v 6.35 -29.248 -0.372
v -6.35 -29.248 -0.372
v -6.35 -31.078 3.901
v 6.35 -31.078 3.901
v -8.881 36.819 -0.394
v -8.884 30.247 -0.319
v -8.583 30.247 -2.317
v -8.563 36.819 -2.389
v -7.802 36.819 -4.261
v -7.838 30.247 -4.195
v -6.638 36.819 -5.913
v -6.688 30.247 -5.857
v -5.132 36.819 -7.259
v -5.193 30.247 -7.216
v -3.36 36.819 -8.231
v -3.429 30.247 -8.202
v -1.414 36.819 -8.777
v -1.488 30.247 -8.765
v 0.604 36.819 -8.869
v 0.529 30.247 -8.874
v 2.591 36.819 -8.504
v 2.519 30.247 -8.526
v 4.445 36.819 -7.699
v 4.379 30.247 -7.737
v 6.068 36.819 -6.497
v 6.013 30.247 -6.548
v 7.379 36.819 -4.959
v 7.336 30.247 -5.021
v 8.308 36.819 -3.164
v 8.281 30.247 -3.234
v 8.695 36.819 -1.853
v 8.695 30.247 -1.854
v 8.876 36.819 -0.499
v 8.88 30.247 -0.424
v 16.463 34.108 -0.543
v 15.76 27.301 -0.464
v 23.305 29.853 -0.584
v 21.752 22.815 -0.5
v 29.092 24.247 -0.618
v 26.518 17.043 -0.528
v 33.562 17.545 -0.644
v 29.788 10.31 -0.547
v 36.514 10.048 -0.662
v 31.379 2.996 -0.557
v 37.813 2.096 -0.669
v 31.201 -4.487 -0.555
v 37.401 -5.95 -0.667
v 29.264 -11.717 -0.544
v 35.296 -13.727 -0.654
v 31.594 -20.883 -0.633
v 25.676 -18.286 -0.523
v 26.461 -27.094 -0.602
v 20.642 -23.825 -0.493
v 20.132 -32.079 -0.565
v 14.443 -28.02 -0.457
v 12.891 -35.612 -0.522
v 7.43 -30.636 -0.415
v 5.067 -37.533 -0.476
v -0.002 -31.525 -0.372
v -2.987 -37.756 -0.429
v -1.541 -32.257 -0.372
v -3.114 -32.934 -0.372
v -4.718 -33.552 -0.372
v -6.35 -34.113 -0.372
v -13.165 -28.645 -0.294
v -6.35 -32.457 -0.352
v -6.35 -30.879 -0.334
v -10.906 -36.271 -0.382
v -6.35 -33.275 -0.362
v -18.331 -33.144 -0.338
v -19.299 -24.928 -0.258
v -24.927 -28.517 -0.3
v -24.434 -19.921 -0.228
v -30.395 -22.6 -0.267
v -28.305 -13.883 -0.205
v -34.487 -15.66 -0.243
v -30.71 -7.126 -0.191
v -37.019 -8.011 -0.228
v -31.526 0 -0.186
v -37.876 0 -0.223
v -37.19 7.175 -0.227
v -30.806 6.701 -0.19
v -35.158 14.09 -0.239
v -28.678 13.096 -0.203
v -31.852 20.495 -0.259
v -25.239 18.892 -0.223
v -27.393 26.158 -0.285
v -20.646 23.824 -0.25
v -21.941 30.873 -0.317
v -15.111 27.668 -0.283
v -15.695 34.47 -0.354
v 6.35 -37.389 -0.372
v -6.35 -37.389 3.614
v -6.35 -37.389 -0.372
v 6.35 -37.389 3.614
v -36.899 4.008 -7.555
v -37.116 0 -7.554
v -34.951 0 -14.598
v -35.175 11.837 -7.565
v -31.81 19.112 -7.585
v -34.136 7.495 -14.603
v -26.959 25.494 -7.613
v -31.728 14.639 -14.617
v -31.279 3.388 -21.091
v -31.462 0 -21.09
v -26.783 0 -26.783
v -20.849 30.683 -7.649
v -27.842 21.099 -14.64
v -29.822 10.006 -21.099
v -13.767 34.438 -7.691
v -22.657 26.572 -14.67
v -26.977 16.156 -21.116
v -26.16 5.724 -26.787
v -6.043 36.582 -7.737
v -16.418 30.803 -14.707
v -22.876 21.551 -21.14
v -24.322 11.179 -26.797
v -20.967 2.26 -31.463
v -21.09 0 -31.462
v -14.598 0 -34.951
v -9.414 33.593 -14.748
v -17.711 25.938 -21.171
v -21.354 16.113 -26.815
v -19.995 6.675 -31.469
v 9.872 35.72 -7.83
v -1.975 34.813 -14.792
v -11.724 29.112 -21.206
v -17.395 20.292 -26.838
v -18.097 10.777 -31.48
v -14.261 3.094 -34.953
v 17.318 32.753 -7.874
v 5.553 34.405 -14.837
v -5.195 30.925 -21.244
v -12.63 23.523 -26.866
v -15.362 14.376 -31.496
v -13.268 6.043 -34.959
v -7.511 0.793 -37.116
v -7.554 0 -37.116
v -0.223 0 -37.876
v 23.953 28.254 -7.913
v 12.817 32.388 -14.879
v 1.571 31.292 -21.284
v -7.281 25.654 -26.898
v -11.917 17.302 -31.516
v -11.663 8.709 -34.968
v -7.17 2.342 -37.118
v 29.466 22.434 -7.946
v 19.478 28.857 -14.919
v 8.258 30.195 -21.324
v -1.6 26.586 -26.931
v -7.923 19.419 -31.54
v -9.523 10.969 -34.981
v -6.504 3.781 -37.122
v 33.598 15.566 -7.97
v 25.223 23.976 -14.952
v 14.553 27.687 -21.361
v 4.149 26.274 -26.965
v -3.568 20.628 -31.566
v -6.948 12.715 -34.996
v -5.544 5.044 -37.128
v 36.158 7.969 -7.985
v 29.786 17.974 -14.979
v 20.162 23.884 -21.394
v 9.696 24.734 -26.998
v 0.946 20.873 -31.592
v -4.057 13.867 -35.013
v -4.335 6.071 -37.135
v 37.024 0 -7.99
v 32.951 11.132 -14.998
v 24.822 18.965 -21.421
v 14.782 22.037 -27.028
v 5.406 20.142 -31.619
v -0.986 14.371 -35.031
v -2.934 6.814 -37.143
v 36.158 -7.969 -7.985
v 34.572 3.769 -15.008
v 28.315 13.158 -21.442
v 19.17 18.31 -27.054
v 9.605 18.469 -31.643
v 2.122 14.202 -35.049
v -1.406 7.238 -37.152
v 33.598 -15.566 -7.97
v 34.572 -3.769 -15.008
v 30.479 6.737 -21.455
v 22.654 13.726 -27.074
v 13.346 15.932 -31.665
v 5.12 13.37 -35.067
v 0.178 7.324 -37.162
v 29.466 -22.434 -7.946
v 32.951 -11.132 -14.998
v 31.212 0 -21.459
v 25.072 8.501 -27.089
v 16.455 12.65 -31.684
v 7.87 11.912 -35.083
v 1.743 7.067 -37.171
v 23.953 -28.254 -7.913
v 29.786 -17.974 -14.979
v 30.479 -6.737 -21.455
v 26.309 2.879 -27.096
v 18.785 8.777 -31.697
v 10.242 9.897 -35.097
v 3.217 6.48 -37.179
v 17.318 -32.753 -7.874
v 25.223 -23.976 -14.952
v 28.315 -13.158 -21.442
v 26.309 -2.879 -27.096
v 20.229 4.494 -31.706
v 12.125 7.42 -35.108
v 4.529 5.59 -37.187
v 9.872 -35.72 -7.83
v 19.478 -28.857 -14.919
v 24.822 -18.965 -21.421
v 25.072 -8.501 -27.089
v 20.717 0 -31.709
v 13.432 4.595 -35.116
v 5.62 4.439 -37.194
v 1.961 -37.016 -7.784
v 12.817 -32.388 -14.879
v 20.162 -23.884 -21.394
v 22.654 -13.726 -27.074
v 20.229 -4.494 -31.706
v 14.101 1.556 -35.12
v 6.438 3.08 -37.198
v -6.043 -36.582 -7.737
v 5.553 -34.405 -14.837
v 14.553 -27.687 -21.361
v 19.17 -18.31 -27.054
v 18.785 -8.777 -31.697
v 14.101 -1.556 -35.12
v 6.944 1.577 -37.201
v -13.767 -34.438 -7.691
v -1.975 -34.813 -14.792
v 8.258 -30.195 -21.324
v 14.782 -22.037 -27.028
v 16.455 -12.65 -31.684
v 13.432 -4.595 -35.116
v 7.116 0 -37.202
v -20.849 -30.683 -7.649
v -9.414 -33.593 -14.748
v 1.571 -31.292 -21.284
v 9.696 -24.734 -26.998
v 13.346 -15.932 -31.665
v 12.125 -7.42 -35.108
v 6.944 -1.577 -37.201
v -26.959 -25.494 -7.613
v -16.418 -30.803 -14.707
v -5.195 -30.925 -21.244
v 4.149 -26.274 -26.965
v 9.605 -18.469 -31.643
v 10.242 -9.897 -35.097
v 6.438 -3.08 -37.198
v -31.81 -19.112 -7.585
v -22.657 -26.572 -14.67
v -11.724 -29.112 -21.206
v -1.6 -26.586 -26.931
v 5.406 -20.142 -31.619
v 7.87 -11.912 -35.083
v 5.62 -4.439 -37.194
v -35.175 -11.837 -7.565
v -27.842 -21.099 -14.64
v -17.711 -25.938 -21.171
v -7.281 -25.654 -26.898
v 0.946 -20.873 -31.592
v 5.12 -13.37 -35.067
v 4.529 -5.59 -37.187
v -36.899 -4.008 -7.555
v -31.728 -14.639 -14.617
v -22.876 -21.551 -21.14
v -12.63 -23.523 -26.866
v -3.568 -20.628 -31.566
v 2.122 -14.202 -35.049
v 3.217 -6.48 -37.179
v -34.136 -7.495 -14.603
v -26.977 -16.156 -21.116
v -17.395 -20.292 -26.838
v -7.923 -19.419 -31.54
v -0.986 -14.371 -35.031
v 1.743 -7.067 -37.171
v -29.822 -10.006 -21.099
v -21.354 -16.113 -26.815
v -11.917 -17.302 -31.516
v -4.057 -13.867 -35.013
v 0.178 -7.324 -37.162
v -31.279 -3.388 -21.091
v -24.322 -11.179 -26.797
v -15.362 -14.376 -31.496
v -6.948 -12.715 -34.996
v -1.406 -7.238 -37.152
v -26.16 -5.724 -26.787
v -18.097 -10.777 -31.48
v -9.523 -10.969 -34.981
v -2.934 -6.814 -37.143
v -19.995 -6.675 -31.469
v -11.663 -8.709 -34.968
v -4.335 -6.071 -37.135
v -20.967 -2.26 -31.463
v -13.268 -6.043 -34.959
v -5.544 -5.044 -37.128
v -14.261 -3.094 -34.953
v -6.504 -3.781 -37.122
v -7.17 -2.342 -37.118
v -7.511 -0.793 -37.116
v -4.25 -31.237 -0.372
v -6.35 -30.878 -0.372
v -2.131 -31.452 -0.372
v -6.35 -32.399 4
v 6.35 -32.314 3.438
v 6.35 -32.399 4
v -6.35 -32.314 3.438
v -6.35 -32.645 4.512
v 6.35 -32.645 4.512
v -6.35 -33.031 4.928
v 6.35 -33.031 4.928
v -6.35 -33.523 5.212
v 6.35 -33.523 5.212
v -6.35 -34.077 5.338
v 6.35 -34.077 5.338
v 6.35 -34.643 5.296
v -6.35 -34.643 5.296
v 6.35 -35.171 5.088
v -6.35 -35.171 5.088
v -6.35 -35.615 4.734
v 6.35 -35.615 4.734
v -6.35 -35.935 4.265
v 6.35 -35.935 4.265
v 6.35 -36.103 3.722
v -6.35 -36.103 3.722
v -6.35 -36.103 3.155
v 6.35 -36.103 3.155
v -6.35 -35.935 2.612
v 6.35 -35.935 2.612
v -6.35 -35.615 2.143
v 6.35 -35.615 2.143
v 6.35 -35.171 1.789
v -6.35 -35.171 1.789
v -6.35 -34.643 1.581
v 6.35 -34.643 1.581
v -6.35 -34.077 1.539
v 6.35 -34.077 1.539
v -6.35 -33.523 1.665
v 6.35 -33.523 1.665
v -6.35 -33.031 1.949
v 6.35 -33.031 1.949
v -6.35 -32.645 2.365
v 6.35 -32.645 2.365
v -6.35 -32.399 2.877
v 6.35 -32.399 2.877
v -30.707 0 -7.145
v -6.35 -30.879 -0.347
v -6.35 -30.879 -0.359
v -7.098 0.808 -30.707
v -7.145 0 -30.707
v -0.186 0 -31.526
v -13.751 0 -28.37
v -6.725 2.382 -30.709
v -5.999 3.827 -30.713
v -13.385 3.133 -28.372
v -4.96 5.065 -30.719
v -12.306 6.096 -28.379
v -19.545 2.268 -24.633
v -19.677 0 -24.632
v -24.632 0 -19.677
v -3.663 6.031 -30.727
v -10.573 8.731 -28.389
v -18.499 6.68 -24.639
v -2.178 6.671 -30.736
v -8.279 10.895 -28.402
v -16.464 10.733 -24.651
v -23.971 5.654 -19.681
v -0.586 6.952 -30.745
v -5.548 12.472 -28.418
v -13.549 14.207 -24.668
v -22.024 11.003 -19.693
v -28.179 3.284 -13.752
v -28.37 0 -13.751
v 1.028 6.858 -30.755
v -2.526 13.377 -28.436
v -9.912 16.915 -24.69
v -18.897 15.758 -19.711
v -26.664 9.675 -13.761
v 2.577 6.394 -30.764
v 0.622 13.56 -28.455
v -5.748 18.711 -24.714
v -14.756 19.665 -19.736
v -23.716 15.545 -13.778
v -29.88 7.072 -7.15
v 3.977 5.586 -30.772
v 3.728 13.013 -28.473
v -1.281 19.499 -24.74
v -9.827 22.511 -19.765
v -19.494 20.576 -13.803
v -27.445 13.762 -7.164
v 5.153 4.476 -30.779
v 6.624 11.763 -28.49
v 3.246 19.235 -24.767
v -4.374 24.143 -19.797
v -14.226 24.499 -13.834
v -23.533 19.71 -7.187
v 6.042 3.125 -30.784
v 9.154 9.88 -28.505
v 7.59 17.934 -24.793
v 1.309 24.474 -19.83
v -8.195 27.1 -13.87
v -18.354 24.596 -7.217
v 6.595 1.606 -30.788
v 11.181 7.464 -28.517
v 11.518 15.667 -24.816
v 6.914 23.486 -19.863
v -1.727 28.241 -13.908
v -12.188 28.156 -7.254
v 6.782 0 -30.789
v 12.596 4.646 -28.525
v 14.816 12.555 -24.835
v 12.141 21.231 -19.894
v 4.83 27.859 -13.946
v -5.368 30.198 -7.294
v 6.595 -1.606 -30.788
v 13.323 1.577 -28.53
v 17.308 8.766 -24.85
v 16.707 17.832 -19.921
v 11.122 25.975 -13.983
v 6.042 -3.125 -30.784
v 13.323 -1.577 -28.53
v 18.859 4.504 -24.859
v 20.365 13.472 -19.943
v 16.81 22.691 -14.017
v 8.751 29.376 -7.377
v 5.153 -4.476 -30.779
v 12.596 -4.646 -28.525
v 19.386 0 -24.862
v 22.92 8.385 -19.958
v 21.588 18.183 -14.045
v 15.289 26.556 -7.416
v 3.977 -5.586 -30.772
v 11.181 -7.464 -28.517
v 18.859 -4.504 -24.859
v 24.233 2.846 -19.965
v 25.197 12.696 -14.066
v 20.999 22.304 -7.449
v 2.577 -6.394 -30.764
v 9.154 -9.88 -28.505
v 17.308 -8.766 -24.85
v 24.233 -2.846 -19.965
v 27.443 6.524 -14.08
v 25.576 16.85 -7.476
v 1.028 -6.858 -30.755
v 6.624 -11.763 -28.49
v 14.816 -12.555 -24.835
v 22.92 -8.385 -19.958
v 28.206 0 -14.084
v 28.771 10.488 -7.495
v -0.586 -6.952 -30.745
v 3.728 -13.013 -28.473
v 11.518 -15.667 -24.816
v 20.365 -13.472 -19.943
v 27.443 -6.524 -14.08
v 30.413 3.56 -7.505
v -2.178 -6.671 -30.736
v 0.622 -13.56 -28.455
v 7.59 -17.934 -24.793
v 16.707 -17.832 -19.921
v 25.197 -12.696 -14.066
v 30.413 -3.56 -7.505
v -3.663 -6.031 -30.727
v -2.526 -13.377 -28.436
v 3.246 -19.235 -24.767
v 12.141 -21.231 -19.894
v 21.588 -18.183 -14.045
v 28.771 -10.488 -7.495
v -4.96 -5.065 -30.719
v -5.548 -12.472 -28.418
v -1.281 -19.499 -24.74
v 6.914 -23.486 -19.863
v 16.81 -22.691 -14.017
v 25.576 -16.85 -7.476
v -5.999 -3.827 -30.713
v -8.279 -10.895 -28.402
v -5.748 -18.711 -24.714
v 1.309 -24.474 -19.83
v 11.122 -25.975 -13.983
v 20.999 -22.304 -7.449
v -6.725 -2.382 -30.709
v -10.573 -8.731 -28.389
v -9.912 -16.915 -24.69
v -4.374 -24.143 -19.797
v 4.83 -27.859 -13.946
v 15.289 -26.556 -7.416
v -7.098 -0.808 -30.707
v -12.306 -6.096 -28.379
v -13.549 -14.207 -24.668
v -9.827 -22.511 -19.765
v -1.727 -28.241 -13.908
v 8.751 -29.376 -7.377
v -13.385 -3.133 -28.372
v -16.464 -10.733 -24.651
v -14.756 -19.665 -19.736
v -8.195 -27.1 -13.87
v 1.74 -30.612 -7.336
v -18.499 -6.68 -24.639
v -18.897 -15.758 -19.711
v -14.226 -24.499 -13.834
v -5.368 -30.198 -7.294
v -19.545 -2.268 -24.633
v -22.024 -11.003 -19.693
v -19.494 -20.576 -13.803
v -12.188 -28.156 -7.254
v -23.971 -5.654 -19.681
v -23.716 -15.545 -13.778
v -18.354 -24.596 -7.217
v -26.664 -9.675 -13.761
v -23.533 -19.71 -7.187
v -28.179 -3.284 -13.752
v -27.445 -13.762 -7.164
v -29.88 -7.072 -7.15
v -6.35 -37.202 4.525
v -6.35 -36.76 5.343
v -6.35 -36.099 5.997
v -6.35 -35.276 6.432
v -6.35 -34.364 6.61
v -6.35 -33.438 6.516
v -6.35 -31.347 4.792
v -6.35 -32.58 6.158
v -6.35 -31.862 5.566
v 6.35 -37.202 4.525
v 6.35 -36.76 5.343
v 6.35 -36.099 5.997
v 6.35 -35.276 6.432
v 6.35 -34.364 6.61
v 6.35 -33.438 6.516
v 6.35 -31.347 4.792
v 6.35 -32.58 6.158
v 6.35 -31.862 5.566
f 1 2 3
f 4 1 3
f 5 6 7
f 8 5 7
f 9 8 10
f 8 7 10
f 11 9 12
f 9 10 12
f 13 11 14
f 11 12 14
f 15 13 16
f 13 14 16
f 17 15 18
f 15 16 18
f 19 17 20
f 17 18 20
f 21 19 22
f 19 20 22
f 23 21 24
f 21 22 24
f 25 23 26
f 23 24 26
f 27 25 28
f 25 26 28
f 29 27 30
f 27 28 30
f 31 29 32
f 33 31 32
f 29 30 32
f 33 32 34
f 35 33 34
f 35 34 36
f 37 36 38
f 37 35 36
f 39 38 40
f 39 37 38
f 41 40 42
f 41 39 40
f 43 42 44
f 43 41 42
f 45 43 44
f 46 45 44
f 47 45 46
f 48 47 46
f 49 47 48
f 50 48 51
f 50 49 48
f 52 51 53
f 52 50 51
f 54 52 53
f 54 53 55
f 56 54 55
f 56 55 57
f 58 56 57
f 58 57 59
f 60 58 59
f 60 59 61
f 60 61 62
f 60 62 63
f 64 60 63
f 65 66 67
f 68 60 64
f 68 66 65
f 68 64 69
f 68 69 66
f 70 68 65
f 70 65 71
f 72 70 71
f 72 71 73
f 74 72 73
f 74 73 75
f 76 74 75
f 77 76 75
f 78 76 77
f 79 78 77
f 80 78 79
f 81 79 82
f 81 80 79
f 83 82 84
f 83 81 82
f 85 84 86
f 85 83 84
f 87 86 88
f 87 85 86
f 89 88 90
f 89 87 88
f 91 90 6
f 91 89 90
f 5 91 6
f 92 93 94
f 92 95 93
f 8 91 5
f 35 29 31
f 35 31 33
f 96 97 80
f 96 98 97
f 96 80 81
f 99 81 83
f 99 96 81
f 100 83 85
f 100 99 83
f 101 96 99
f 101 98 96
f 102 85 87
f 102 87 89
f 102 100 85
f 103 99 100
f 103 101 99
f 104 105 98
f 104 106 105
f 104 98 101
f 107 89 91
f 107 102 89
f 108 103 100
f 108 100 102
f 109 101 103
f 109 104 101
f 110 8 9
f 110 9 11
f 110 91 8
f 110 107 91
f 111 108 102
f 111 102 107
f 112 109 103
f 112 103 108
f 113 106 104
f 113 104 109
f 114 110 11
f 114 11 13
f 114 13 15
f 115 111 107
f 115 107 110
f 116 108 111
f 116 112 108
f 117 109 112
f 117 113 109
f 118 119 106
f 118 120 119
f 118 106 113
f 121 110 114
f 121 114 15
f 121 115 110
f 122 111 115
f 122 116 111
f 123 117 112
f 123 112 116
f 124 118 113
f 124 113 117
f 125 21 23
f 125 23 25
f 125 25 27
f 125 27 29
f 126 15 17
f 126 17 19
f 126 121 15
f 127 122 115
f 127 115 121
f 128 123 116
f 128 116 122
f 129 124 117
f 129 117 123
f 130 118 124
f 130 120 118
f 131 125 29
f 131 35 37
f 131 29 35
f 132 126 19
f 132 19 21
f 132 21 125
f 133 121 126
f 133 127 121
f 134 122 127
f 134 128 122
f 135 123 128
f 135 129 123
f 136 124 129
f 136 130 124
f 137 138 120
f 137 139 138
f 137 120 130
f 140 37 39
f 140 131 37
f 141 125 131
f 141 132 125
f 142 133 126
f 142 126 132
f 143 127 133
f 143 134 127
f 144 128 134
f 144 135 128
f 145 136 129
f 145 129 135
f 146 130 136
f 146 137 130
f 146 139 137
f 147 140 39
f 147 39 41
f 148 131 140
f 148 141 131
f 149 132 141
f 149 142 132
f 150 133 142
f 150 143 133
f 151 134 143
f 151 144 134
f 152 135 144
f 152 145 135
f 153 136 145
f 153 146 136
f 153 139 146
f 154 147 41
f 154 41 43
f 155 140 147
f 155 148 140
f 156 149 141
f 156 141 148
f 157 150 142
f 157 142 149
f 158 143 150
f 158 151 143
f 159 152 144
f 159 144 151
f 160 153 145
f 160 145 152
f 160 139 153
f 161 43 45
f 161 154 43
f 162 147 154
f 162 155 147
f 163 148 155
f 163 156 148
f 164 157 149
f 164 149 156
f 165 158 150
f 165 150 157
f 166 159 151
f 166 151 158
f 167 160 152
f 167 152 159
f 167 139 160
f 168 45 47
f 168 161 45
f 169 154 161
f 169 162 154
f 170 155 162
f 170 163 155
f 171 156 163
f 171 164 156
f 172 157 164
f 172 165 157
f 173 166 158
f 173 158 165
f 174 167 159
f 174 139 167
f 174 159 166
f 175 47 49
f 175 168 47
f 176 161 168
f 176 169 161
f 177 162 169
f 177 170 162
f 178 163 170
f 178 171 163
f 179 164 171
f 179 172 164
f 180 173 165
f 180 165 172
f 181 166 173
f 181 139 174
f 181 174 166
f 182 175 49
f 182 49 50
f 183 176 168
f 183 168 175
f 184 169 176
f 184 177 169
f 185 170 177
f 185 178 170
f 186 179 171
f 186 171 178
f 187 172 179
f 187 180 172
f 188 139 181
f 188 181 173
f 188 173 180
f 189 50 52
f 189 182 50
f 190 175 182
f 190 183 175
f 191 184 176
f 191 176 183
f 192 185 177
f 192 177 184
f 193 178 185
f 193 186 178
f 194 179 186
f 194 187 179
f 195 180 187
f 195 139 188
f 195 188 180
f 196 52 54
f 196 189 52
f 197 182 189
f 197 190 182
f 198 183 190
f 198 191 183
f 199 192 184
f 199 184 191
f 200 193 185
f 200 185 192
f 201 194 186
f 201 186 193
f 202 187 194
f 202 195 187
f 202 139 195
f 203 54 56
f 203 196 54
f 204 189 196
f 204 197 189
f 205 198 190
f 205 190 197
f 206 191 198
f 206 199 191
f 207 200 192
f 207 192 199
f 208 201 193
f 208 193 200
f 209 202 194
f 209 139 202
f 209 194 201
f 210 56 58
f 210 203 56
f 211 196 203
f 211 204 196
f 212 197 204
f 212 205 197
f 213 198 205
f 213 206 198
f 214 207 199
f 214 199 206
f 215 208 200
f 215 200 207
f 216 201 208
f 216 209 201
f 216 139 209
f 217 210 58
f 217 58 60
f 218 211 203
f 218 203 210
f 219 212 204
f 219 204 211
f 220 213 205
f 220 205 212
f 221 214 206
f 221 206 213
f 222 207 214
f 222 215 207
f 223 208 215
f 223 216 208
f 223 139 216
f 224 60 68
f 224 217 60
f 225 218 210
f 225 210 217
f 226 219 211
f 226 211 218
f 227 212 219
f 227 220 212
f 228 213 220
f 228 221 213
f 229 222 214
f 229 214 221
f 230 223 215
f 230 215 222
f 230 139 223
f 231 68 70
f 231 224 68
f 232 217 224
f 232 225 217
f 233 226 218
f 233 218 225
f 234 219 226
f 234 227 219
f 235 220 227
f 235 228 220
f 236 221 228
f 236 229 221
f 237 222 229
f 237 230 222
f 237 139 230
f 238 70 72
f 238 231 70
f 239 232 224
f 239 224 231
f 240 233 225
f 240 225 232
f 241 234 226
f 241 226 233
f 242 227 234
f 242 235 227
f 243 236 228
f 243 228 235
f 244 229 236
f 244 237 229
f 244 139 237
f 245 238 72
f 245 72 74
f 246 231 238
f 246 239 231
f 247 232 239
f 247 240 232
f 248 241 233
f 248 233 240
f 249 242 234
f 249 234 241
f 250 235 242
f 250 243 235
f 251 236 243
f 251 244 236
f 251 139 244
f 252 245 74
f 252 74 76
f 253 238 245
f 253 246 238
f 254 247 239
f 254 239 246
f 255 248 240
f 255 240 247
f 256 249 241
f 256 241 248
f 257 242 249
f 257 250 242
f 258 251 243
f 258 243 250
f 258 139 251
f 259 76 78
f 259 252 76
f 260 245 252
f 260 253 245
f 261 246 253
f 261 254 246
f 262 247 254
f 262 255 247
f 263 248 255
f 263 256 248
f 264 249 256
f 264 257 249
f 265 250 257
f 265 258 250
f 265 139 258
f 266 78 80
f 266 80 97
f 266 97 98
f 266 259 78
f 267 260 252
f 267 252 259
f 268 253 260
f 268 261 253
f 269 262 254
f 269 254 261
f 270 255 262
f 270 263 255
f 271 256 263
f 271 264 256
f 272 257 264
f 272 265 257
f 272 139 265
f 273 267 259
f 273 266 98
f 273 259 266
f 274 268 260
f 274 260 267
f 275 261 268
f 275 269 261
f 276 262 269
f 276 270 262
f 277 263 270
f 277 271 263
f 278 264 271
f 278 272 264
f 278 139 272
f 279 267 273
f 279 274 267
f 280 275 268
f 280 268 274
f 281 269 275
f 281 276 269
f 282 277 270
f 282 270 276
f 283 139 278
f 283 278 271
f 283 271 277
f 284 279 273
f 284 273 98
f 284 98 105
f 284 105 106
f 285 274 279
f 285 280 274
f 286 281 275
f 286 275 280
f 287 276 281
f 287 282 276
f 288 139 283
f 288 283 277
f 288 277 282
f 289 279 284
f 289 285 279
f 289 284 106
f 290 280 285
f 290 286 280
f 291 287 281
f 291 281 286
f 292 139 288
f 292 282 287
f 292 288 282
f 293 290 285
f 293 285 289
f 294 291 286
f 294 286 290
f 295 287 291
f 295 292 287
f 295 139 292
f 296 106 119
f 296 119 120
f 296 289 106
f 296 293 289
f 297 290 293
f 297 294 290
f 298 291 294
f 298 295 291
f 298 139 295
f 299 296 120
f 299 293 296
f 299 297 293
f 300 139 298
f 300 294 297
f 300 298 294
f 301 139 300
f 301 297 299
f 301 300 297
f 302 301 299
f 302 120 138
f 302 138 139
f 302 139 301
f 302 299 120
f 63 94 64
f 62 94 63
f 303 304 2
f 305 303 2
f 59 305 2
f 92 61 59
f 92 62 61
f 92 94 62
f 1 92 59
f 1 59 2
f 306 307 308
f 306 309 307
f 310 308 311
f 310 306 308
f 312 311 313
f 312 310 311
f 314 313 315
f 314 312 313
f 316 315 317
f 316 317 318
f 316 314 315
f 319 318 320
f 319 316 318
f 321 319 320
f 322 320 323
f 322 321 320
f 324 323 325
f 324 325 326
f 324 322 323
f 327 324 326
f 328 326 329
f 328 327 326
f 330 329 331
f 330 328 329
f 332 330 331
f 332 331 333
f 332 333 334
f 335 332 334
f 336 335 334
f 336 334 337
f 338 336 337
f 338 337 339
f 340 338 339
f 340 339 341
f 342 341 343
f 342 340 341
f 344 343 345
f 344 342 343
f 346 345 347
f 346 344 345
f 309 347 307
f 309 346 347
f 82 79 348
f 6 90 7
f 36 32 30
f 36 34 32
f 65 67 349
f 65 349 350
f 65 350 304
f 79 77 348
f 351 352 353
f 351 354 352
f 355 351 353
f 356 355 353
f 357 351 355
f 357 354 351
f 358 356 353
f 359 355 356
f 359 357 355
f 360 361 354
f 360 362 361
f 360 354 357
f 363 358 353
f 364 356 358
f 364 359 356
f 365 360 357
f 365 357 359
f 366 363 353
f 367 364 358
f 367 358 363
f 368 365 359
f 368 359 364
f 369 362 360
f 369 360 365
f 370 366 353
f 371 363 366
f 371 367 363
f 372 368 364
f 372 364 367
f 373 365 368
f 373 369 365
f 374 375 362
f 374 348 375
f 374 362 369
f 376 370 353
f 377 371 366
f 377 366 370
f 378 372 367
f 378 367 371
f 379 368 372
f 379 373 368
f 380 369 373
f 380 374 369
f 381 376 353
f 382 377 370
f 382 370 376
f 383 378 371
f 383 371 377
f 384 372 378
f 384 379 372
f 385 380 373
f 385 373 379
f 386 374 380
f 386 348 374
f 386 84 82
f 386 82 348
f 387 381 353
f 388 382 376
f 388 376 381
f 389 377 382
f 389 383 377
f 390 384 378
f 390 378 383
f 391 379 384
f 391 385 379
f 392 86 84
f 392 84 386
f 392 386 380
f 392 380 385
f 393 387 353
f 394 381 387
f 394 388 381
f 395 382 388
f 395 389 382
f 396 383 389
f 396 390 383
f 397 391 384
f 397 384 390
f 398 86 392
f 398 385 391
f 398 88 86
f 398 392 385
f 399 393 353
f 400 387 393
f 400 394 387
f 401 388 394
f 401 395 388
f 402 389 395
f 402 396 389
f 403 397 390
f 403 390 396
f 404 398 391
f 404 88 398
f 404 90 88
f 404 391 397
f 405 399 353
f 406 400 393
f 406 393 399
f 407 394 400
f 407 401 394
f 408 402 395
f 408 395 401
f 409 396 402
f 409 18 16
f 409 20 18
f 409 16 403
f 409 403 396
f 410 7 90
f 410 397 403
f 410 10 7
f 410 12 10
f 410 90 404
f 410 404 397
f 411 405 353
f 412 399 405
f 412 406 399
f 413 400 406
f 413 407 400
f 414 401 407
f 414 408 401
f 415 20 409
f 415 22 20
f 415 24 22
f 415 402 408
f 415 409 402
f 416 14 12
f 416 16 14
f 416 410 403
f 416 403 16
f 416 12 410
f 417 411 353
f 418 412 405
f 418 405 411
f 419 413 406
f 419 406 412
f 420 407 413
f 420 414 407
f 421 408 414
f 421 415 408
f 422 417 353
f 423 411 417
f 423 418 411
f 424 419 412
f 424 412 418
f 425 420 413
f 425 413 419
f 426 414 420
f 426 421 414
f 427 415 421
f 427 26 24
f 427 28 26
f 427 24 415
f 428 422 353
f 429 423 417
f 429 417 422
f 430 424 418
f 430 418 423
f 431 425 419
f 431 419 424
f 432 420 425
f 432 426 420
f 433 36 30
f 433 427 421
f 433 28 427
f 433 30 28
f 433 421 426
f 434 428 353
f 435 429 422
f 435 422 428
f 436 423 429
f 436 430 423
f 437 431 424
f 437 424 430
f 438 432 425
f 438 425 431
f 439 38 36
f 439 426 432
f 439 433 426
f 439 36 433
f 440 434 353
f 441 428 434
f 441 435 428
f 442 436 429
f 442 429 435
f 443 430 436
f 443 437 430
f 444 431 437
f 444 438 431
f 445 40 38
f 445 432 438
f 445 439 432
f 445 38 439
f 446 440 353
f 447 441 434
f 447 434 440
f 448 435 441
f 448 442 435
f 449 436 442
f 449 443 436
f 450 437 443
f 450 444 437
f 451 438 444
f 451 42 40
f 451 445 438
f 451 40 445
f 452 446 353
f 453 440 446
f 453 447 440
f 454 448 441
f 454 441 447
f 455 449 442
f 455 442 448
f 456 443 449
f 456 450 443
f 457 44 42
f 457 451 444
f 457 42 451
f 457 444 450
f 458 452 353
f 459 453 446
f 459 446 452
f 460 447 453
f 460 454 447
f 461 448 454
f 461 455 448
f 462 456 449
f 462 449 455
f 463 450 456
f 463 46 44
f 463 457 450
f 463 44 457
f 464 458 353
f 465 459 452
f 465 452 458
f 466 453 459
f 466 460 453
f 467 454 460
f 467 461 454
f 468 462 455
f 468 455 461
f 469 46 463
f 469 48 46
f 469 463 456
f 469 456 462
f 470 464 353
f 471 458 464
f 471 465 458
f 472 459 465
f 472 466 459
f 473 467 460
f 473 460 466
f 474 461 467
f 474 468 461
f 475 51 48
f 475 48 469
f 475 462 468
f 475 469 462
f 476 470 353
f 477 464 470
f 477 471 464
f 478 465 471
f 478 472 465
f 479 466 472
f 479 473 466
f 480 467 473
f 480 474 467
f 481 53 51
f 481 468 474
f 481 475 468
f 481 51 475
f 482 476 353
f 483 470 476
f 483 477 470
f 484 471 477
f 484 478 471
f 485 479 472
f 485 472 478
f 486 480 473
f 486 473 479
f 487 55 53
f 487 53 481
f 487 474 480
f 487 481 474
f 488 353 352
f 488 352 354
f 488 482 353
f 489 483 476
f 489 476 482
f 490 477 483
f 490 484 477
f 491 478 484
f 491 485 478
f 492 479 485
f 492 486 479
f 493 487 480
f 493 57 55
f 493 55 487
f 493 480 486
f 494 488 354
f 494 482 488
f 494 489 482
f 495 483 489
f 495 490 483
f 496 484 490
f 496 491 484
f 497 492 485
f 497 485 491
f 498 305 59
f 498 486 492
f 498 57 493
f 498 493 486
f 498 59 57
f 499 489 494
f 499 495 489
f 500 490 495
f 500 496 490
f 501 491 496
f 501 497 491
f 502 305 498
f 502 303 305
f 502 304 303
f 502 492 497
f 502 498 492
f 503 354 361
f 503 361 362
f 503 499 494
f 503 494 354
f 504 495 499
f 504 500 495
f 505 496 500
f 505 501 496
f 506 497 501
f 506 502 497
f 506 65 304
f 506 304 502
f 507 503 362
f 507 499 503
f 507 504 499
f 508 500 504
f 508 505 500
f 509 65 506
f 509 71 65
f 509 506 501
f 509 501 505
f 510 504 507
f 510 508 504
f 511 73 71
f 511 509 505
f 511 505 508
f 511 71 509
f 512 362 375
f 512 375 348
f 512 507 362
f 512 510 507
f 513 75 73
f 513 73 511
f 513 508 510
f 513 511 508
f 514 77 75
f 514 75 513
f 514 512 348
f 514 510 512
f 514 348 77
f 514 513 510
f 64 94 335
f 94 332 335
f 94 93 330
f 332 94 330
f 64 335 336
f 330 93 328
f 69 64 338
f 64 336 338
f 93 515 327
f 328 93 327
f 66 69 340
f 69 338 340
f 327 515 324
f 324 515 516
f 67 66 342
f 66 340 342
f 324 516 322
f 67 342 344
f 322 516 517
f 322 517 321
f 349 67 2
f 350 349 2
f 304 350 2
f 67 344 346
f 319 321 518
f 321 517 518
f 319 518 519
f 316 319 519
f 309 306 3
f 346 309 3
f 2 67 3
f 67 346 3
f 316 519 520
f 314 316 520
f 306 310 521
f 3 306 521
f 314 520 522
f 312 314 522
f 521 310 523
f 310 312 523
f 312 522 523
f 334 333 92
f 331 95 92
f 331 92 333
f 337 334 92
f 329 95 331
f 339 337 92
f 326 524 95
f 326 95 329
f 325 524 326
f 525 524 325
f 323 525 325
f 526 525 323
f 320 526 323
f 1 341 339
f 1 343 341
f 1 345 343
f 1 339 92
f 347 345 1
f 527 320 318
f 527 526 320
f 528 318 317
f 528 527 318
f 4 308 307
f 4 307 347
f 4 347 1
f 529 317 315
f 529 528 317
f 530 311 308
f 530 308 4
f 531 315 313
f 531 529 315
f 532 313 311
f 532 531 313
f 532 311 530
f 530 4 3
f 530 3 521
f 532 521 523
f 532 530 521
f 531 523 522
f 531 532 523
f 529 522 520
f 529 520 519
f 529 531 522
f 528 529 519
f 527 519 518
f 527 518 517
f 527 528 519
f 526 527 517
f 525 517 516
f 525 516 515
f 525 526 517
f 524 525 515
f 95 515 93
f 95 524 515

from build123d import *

# Parameters (mm, degrees)
F2_R     = 8.89
F3_DEPTH = 37.8751575137
F4_R     = 1.905
F5_DEPTH = 6.35


with BuildPart() as f1:
    # F0 (on Front) → F1 (revolve)
    with BuildSketch(Plane.XZ):
        with BuildLine():
            ThreePointArc((-0.1857913862, -31.5262409051), (-22.2928058356, -22.2928058356), (-31.5262409051, -0.1857913862))
            Line((-31.5262409051, -0.1857913862), (-37.8761306398, -0.2232127463))
            ThreePointArc((-37.8761306398, -0.2232127463), (-26.7829338961, -26.7829338961), (-0.2232127463, -37.8761306398))
            Line((-0.2232127463, -37.8761306398), (-0.1857913862, -31.5262409051))
        make_face()
    revolve(axis=Axis((-0.2045020662, 0, -34.7011857724), (-0.0058931276, 0, -0.9999826354)))

    # F2 (on Front) → F3 (cut, through all)
    with BuildSketch(Plane.XZ):
        Circle(F2_R)
    extrude(amount=-F3_DEPTH, mode=Mode.SUBTRACT)

    # F4 (on Right) → F5 (join, symmetric)
    with BuildSketch(Plane.YZ):
        with BuildLine():
            Line((-37.3891351909, -0.3715698676), (-31.5245985714, -0.3715698676))
            Line((-31.5245985714, -0.3715698676), (-29.2478017509, -0.3715698676))
            Line((-29.2478017509, -0.3715698676), (-31.0778754838, 3.9011891729))
            ThreePointArc((-31.0778754838, 3.9011891729), (-34.3635014884, 6.610138796), (-37.3891351909, 3.613592951))
            Line((-37.3891351909, 3.613592951), (-37.3891351909, 3.2632673138))
            Line((-37.3891351909, 3.2632673138), (-37.3891351909, -0.3715698676))
        make_face()
        with Locations((-34.2189706862, 3.4384301324)):
            Circle(F4_R, mode=Mode.SUBTRACT)
    extrude(amount=F5_DEPTH, both=True)


solid = f1.part
